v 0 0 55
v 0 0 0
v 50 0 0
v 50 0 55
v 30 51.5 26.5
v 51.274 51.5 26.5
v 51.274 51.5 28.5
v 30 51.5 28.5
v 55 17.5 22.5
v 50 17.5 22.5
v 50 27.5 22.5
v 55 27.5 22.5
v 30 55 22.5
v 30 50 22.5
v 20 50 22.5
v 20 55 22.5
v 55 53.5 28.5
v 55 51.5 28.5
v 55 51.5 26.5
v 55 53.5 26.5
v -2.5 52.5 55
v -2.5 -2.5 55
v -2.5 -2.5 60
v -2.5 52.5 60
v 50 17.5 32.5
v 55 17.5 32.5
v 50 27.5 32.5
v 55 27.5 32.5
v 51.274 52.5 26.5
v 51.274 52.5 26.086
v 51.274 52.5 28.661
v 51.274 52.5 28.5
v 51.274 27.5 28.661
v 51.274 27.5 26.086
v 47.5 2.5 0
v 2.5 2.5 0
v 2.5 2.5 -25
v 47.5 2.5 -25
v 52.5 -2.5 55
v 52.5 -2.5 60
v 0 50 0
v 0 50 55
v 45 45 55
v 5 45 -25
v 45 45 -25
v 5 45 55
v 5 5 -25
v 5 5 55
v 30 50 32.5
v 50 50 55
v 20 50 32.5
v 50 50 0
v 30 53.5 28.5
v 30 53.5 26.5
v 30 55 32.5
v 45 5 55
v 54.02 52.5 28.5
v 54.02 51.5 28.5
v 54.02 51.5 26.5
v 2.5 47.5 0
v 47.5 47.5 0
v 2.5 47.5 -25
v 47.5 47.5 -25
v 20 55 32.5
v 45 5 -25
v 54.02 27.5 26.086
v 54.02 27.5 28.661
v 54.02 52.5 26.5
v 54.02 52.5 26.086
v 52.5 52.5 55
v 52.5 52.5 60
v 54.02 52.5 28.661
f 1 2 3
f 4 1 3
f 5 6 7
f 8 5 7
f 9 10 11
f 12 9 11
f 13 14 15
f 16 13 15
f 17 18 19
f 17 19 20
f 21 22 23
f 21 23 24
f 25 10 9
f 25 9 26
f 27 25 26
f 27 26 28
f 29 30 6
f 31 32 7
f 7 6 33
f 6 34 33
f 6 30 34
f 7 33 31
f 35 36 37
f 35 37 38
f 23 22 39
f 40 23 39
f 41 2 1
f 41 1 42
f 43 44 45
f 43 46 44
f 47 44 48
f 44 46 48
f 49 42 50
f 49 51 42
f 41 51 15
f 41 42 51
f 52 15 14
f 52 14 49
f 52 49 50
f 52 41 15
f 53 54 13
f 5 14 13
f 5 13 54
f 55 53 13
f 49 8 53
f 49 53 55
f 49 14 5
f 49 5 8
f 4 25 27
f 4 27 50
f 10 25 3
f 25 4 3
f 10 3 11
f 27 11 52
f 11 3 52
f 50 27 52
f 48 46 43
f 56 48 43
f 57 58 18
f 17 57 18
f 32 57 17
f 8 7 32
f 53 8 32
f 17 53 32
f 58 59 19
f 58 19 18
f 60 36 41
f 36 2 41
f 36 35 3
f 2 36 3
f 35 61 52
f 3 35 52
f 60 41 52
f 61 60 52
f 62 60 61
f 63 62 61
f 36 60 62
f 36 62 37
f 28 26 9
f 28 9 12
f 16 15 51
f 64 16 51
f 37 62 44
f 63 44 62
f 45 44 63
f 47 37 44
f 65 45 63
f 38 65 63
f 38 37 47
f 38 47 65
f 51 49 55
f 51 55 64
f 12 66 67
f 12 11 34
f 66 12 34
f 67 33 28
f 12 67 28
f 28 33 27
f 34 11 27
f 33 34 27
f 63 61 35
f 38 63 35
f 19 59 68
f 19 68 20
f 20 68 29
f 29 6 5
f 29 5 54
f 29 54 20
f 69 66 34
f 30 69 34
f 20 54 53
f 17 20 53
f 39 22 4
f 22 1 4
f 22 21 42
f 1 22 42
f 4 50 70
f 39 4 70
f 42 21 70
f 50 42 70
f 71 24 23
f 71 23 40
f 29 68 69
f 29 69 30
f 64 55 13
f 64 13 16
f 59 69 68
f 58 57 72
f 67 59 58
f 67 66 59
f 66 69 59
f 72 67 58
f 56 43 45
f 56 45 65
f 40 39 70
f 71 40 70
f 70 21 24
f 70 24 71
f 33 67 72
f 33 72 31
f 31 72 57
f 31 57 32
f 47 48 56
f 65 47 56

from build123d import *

# Parameters (mm, degrees)
F0_W      = 50
F0_H      = 50
F0_W_2    = 40
F0_H_2    = 40
F1_DEPTH  = 55
F2_W      = 55
F2_H      = 55
F3_DEPTH  = 5
F4_W      = 45
F4_H      = 45
F4_W_2    = 40
F4_H_2    = 40
F5_DEPTH  = 25
F6_W      = 10
F6_H      = 10
F7_DEPTH  = 5
F8_W      = 2
F8_H      = 2
F9_DEPTH  = 25
F11_W     = 10
F11_H     = 10
F12_DEPTH = 5
F13_W     = 2.745383
F13_H     = 2.574146
F14_DEPTH = 25


with BuildPart() as f1:
    # F0 (on Top) → F1 (new body)
    with BuildSketch(Plane.XY):
        with Locations((25, 25)):
            Rectangle(F0_W, F0_H)
        with Locations((25, 25)):
            Rectangle(F0_W_2, F0_H_2, mode=Mode.SUBTRACT)
    extrude(amount=F1_DEPTH)

    # F2 (on face) → F3 (join)
    with BuildSketch(Plane.XY.offset(55)):
        with Locations((25, 25)):
            Rectangle(F2_W, F2_H)
    extrude(amount=F3_DEPTH)

    # F4 (on face) → F5 (join)
    with BuildSketch(Plane(origin=(0, 0, 0), x_dir=(1, 0, 0), z_dir=(0, 0, -1))):
        with Locations((25, -25)):
            Rectangle(F4_W, F4_H)
        with Locations((25, -25)):
            Rectangle(F4_W_2, F4_H_2, mode=Mode.SUBTRACT)
    extrude(amount=F5_DEPTH)

    # F6 (on face) → F7 (join)
    with BuildSketch(Plane(origin=(0, 50, 0), x_dir=(-1, 0, 0), z_dir=(0, 1, 0))):
        with Locations((-25, 27.5)):
            Rectangle(F6_W, F6_H)
    extrude(amount=F7_DEPTH)

    # F8 (on face) → F9 (join)
    with BuildSketch(Plane.YZ.offset(30)):
        with Locations((52.5, 27.5)):
            Rectangle(F8_W, F8_H)
    extrude(amount=F9_DEPTH)

    # F11 (on face) → F12 (join)
    with BuildSketch(Plane.YZ.offset(50)):
        with Locations((22.5, 27.5)):
            Rectangle(F11_W, F11_H)
    extrude(amount=F12_DEPTH)

    # F13 (on face) → F14 (join)
    with BuildSketch(Plane(origin=(0, 27.5, 0), x_dir=(-1, 0, 0), z_dir=(0, 1, 0))):
        with Locations((-52.646901, 27.373498)):
            Rectangle(F13_W, F13_H)
    extrude(amount=F14_DEPTH)


solid = f1.part
